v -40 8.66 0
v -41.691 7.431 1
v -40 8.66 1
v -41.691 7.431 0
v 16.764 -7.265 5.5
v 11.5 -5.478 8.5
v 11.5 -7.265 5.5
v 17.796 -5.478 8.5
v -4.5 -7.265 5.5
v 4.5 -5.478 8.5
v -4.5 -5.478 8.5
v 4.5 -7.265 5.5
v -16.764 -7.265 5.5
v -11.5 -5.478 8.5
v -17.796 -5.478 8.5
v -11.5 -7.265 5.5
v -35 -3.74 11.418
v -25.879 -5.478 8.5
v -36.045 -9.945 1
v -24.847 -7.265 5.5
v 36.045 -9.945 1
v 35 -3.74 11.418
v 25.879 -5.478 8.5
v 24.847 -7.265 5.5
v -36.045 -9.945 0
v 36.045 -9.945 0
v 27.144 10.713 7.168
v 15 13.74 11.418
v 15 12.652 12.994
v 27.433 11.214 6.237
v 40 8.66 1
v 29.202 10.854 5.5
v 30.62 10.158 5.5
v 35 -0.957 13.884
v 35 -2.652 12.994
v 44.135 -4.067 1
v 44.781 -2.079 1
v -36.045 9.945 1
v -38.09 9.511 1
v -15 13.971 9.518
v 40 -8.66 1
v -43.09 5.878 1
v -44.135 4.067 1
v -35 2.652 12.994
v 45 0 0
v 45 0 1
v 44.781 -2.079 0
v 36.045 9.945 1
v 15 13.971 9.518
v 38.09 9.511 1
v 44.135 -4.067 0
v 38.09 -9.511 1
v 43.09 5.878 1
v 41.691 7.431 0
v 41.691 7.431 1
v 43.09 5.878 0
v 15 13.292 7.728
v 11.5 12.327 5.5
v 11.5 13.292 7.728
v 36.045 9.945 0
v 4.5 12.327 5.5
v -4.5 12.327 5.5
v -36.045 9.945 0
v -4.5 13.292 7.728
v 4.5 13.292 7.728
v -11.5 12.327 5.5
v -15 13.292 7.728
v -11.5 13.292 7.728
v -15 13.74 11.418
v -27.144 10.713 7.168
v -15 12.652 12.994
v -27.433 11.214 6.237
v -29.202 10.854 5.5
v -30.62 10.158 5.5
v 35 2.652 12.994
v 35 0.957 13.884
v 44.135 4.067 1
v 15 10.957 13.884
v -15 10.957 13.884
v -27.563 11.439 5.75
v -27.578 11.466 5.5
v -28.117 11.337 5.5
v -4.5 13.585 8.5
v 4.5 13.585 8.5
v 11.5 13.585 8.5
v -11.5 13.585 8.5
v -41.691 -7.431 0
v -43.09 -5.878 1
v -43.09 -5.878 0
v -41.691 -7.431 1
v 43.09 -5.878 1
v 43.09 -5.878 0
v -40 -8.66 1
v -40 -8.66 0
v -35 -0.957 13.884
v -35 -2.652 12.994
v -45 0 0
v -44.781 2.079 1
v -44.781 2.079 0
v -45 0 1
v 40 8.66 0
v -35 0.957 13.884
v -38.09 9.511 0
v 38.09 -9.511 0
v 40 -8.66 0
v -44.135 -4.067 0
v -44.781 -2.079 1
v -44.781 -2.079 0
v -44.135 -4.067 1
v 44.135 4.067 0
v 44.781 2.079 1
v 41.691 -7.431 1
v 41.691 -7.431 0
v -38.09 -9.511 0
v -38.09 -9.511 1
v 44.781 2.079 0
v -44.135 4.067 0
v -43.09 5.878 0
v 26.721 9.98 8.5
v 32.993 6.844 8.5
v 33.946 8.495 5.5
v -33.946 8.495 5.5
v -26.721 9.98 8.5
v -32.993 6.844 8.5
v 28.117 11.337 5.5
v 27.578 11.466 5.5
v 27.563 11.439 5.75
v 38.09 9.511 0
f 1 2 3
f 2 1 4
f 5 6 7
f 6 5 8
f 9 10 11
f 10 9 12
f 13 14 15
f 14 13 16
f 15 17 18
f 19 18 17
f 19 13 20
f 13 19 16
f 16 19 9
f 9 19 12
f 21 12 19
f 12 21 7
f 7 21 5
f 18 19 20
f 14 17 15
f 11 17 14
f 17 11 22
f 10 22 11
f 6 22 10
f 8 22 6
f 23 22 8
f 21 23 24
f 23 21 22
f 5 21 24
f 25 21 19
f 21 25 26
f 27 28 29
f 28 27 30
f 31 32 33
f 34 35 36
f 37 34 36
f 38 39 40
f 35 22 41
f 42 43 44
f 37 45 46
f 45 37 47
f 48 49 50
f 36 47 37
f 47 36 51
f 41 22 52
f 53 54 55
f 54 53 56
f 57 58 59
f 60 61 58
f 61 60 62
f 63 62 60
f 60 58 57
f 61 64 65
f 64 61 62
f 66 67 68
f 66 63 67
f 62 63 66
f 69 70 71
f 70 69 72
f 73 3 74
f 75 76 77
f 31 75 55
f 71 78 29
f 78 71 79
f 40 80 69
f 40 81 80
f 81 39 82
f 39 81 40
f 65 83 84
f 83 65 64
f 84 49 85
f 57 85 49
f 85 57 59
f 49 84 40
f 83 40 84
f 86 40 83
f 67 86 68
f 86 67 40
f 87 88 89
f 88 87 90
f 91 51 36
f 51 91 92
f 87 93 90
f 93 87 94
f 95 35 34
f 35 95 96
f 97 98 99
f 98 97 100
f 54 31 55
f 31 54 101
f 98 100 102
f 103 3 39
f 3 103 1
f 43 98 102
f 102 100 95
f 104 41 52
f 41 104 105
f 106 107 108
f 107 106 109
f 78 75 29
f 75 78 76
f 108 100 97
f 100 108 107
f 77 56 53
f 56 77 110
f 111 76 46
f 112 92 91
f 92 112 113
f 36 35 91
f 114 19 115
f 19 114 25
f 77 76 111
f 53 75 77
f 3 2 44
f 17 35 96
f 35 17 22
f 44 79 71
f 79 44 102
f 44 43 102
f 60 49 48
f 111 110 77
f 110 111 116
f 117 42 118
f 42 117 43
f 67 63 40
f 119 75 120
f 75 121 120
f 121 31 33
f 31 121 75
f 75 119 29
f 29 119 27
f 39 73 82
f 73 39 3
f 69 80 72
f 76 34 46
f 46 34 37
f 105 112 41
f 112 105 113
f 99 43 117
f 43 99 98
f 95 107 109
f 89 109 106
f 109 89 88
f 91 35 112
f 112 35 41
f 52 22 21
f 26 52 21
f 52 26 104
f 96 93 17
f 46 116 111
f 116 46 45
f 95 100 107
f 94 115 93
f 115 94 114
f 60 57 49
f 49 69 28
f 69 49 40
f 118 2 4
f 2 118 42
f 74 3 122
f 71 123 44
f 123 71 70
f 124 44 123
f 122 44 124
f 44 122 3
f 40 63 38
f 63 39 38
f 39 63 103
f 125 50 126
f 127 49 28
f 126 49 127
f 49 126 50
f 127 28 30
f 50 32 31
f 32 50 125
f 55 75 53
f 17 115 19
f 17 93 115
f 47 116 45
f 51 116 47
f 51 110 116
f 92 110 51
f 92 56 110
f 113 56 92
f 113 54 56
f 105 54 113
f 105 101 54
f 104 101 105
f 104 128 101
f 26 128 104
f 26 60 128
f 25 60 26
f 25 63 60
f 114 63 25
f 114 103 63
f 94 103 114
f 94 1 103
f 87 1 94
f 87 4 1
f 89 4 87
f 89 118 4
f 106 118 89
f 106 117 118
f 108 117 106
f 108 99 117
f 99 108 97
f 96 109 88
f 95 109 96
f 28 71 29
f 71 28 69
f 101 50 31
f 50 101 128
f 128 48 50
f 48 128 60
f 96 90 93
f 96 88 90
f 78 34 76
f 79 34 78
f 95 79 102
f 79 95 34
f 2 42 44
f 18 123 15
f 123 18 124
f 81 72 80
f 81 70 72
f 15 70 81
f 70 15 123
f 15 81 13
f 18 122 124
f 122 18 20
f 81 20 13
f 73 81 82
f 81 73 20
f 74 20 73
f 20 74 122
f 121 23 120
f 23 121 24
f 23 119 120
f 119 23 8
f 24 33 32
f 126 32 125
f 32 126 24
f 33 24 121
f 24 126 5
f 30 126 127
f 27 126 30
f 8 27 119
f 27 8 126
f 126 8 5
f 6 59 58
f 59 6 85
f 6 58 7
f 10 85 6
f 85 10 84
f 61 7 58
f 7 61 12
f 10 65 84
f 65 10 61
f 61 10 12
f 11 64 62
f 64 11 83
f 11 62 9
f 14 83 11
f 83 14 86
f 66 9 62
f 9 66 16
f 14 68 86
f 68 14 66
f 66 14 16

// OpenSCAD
difference(){
hull(){
translate([10+50/2,0,0])cylinder(r=20/2,h=1);
translate([-10-50/2,0,0])cylinder(r=20/2,h=1);
translate([0,0,10])rotate([0,90,0])cylinder(r=8/2,h=70,center=true);
    translate([0,10,10])rotate([0,90,0])cylinder(r=8/2,h=30,center=true);
}

translate([-25,0,7])rotate([0,0,30])cube([7,50,3],center=true);
translate([25,0,7])rotate([0,0,-30])cube([7,50,3],center=true);
translate([8,0,7])cube([7,50,3],center=true);
translate([-8,0,7])cube([7,50,3],center=true);
}
